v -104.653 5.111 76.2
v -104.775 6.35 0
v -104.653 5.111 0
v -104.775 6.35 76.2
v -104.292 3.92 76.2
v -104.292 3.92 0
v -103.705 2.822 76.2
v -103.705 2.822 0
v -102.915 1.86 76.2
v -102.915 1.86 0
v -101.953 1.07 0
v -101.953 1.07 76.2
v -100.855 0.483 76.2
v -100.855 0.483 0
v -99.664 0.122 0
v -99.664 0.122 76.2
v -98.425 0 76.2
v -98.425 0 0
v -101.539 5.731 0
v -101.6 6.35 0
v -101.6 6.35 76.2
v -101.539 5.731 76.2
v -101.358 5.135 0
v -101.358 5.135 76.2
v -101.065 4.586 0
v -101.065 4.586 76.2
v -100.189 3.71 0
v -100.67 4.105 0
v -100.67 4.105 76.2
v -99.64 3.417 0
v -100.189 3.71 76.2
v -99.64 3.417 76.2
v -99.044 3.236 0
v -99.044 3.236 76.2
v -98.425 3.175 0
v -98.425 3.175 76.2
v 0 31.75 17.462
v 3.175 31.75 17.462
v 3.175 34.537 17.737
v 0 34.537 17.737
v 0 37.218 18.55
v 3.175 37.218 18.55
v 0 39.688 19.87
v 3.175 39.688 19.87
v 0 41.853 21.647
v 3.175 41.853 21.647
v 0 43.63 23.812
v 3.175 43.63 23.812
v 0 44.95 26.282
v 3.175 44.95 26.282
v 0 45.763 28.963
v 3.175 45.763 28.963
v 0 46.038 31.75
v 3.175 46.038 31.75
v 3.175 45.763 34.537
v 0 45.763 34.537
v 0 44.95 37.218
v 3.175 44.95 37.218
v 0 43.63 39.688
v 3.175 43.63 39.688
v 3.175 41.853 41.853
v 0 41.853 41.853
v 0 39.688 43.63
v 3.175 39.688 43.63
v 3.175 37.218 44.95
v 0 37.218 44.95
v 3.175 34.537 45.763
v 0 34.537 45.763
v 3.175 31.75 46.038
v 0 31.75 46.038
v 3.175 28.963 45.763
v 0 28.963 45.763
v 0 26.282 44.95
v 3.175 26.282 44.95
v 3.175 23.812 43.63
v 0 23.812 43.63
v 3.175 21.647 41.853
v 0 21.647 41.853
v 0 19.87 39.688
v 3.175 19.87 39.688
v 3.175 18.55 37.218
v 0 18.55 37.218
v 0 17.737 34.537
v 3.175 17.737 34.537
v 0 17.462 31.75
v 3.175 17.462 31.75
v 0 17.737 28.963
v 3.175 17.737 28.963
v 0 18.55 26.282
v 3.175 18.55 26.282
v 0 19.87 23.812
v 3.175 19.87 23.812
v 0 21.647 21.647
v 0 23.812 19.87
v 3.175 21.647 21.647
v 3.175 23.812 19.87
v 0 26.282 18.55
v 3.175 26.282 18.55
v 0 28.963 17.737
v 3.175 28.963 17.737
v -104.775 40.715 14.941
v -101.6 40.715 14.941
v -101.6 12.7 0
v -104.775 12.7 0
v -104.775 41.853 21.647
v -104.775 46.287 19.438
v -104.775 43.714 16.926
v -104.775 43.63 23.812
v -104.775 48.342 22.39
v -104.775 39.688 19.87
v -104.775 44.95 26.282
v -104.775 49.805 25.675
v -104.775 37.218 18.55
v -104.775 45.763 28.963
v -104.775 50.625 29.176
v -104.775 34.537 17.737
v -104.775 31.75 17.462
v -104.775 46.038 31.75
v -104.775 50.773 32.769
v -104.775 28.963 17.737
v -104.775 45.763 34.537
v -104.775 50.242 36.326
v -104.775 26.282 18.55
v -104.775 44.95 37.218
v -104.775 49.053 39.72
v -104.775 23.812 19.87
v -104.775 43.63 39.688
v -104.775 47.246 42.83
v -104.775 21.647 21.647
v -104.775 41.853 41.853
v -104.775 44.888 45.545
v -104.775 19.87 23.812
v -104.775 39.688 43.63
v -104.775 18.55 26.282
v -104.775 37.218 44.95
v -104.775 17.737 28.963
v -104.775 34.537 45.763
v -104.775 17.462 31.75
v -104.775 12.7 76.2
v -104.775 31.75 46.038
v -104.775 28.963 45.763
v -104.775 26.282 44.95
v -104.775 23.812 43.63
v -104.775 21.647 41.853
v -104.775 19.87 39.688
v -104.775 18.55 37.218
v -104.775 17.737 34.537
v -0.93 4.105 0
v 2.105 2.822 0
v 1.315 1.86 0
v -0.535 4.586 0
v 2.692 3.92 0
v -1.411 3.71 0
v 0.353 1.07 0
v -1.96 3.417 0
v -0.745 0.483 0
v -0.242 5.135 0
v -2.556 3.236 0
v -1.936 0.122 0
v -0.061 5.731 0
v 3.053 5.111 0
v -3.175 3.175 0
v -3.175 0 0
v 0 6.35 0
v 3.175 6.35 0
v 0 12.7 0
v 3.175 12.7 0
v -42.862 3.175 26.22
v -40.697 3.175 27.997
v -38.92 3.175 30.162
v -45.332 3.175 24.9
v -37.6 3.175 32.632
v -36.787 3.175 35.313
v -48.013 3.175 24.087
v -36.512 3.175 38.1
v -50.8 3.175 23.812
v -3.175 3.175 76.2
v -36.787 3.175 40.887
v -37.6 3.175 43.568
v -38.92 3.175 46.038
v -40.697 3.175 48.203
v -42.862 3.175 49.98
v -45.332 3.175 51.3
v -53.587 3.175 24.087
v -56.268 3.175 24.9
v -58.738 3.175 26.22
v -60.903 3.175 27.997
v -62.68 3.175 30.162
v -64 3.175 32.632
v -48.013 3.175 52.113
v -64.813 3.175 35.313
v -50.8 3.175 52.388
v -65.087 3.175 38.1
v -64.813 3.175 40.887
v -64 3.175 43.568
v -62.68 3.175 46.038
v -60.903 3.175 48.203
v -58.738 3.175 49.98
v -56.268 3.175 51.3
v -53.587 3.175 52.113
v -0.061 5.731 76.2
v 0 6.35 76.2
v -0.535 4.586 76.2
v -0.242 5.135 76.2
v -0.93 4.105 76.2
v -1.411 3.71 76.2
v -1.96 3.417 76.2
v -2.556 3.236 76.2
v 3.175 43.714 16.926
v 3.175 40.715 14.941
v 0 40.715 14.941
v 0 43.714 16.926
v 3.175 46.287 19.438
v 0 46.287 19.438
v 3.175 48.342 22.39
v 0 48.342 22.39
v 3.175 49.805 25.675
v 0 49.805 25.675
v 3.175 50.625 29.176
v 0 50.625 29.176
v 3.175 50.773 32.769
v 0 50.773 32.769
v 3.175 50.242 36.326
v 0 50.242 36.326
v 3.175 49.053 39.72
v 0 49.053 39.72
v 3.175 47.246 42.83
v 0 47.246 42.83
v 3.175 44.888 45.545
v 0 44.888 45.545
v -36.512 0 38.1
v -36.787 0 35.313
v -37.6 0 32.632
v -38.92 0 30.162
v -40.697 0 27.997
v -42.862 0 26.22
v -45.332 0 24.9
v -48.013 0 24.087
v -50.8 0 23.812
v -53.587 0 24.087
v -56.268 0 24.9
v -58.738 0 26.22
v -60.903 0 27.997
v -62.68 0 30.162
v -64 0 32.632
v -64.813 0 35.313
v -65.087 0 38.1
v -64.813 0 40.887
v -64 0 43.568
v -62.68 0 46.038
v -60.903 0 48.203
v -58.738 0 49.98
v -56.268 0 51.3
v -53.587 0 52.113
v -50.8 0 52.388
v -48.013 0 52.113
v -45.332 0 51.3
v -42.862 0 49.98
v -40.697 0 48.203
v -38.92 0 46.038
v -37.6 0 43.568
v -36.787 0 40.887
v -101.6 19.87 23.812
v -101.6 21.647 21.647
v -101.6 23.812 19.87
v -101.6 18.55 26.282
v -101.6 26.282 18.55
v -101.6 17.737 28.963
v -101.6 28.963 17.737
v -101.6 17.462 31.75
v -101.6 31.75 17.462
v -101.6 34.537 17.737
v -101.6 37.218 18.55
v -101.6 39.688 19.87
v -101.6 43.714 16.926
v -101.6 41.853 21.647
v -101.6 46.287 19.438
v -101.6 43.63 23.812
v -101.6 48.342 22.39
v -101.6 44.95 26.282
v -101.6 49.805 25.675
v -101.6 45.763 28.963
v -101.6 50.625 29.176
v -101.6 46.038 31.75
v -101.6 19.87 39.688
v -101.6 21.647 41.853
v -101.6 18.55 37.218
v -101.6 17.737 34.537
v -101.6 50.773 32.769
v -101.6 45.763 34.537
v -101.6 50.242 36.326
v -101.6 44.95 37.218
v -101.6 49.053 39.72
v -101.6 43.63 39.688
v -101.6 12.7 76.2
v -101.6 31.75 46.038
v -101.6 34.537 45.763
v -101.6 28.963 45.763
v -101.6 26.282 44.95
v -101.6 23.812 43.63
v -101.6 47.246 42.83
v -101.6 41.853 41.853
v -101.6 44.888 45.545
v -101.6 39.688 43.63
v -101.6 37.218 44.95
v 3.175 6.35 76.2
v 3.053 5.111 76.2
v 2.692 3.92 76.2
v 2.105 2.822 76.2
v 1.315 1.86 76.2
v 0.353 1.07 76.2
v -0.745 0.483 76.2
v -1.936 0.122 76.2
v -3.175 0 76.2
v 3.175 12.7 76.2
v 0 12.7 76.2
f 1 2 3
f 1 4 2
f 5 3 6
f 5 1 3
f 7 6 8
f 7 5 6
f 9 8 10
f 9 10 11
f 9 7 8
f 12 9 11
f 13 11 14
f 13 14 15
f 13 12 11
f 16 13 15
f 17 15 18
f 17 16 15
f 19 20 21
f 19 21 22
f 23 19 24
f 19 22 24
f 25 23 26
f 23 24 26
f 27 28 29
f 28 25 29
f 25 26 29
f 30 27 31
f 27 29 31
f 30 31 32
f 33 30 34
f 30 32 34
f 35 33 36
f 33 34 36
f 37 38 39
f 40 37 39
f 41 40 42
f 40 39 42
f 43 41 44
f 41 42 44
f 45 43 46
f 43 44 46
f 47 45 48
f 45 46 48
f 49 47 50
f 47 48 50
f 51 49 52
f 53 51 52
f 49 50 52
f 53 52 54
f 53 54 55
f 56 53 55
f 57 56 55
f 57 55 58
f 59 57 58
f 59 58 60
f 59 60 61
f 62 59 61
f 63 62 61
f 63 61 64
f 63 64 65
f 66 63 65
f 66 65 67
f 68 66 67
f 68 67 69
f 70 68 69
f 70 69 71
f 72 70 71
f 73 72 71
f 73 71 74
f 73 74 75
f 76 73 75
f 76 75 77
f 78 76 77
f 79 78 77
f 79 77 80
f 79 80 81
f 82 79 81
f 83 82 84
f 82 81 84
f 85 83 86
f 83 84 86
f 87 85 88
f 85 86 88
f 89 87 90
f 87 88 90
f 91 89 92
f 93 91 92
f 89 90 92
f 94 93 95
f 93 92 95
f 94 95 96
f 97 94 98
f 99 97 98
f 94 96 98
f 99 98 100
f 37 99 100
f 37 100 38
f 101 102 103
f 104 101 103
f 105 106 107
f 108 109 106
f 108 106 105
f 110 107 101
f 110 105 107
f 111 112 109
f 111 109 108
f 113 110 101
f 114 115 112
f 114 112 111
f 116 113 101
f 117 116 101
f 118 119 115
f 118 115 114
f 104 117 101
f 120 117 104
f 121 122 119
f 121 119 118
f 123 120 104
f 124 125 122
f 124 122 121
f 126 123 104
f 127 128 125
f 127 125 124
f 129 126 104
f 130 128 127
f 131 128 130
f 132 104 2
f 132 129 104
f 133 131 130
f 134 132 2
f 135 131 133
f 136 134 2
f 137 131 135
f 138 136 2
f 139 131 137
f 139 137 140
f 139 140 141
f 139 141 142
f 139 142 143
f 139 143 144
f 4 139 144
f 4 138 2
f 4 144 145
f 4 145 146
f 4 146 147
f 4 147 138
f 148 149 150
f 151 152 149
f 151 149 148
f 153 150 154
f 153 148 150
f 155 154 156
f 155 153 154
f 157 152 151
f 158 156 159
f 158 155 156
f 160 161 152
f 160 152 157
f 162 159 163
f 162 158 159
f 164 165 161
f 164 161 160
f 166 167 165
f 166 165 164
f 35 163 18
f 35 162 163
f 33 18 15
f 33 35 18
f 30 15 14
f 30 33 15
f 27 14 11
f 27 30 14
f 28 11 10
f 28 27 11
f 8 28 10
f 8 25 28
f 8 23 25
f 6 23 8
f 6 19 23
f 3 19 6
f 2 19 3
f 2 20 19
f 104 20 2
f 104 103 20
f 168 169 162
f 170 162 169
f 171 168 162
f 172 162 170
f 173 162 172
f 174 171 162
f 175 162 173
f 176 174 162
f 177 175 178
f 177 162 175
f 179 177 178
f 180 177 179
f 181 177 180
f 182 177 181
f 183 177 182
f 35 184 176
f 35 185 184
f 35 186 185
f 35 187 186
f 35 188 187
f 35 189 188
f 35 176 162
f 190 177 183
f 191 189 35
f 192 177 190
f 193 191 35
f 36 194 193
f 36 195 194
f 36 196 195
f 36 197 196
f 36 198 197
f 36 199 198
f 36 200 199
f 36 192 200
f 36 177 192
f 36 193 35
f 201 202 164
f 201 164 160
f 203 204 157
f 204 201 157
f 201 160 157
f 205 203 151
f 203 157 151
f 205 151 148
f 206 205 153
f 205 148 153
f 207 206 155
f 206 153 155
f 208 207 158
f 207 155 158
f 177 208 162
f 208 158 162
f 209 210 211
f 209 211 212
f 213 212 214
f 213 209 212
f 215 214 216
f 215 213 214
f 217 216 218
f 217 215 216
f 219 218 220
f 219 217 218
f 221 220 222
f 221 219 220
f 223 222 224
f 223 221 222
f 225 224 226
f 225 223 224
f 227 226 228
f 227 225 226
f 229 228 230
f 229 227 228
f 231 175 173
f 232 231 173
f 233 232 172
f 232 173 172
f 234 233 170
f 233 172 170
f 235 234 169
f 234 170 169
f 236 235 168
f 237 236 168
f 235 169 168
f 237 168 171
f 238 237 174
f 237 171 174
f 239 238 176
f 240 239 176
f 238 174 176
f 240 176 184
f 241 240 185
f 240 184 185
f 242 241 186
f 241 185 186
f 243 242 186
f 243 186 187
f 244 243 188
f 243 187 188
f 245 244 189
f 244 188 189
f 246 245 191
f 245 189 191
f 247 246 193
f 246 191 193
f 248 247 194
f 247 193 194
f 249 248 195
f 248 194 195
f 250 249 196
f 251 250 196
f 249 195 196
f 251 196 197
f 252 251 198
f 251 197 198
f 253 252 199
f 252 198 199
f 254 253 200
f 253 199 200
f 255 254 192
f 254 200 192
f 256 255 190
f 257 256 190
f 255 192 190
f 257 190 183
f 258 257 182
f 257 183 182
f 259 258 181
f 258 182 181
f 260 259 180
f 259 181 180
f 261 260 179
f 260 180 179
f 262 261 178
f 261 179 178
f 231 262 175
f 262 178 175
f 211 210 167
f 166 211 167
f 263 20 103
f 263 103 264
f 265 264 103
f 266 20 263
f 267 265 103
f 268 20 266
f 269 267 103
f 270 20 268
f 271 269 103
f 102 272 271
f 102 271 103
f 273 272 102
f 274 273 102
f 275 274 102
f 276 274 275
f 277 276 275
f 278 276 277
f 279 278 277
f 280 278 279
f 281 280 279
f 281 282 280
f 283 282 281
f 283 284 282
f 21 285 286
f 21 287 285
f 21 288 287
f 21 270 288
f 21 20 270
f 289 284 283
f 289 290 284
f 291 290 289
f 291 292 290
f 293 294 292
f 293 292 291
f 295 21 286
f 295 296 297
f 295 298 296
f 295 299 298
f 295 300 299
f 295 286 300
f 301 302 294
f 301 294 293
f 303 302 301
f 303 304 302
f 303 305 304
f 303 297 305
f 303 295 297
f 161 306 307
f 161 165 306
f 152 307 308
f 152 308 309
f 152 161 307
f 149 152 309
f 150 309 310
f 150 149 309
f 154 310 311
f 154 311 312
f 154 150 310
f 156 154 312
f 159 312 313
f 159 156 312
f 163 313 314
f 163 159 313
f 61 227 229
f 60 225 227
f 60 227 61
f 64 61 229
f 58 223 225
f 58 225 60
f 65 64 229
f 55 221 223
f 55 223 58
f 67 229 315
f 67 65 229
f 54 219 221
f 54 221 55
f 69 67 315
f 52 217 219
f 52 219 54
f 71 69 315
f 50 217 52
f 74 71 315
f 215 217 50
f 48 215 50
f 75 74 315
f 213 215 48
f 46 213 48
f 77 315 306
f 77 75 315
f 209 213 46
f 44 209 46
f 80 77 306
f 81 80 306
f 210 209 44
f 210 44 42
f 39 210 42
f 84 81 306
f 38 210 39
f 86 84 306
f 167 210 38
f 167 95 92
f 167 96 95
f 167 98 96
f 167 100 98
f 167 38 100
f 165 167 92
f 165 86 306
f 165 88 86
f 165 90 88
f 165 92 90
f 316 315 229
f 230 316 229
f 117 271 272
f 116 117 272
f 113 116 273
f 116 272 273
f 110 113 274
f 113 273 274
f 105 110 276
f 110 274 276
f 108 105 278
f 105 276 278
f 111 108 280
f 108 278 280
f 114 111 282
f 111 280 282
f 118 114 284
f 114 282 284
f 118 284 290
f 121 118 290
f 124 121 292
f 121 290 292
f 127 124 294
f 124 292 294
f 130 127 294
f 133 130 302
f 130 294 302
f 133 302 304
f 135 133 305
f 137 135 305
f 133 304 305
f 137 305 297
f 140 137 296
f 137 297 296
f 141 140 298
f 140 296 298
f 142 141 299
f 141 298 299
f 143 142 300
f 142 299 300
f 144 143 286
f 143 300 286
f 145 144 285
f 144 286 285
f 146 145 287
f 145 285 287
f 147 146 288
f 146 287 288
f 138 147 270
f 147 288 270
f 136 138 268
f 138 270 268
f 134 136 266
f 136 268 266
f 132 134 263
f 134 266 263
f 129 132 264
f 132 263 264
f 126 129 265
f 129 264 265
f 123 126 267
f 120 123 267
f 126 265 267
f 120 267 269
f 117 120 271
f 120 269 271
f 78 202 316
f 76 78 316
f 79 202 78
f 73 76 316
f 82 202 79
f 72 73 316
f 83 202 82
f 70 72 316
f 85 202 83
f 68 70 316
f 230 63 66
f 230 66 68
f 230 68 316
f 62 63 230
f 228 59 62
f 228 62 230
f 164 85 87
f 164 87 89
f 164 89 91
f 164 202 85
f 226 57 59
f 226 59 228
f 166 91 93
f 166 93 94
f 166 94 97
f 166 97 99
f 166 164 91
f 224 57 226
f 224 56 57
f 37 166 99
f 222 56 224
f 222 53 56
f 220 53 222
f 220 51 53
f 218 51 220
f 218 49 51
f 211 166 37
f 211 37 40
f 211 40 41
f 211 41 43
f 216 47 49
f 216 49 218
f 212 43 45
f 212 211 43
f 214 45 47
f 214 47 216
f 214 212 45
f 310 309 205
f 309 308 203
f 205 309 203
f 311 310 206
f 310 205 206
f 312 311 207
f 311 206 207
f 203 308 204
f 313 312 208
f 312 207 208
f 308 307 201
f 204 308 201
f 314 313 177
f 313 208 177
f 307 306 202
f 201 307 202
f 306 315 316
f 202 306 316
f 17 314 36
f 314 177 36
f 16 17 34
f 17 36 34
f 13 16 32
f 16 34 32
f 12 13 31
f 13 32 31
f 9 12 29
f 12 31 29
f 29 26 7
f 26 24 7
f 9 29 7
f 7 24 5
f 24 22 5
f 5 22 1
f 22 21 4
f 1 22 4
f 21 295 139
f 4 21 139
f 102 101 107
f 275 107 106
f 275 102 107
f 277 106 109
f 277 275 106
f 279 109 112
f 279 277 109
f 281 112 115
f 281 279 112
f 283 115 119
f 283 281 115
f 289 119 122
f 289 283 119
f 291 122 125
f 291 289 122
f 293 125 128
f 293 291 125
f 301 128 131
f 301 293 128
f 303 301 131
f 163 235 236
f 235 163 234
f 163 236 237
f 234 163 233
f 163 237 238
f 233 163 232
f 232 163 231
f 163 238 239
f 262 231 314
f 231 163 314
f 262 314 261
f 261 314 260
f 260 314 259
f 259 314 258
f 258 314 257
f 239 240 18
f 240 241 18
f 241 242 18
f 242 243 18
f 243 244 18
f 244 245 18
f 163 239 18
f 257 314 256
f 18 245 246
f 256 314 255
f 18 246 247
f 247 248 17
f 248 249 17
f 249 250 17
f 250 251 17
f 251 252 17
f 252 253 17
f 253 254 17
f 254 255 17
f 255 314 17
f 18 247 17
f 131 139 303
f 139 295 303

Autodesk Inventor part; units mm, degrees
ref_plane "YZ Plane" through (0, 0, 0) normal (1, 0, 0) x (0, 1, 0)
ref_plane "XZ Plane" through (0, 0, 0) normal (0, 1, 0) x (-1, 0, 0)
ref_plane "XY Plane" through (0, 0, 0) normal (0, 0, 1) x (1, 0, 0)
sketch "Sketch1" plane through (0, 0, 0) normal (0, 1, 0) x (-1, 0, 0)
  line L0 (0, 0) -> (101.6, 0)
  line L1 (101.6, 0) -> (101.6, 76.2)
  line L2 (101.6, 76.2) -> (0, 76.2)
  line L3 (0, 76.2) -> (0, 0)
  dimension "d0" = 101.6
  dimension "d2" = 76.2
extrude "Plate1" add sketch "Sketch1" along normal blind 3.175
sketch "Sketch2" plane through (-101.6, 3.175, 76.2) normal (-1, 0, 0) x (0, -1, 0)
  line L0 (0, -76.2) -> (0, 0)
  line L1 (0, 0) -> (-47.625, 0)
  line L2 (-47.625, 0) -> (-47.625, -76.2)
  line L3 (-47.625, -76.2) -> (0, -76.2)
edge flange "Flange1" height 50.8 angle 90 thickness 3.175 bend radius 3.175 thickness toward (-1, 0, 0) relief tear relief width 3.175 relief depth 1.5875 edges at (-101.6, 3.175, 38.1) wall of the first edge with corners at (-101.6, 3.175, 0) (-101.6, 3.175, 76.2) (-101.6, 50.8, 76.2) (-101.6, 50.8, 0)
bend "Bend1"
corner "Corner1"
sketch "Sketch3" plane through (0, 3.175, 0) normal (1, 0, 0) x (0, 1, 0)
  line L0 (0, 76.2) -> (0, 0)
  line L1 (0, 0) -> (47.625, 0)
  line L2 (47.625, 0) -> (47.625, 76.2)
  line L3 (47.625, 76.2) -> (0, 76.2)
edge flange "Flange2" height 50.8 angle 90 thickness 3.175 bend radius 3.175 thickness toward (1, 0, 0) relief tear relief width 3.175 relief depth 1.5875 edges at (0, 3.175, 38.1) wall of the first edge with corners at (0, 3.175, 76.2) (0, 3.175, 0) (0, 50.8, 0) (0, 50.8, 76.2)
bend "Bend2"
corner "Corner2"
sketch "Sketch4" plane through (-101.6, 50.8, 76.2) normal (1, 0, 0) x (0, 0, -1)
  line L0 (76.2, 0) -> (0, 0) projected
  circle A0 centre (44.45, -19.05) radius 14.2875
  point P0 (76.2, -50.8)
  dimension "d24" = 28.575
  dimension "d25" = 19.05
extrude "Cut1" cut sketch "Sketch4" against normal mid plane 5080
sketch "Sketch5" plane through (3.175, 50.8, 76.2) normal (1, 0, 0) x (0, 0, -1)
  circle A0 centre (44.45, -19.05) radius 14.2875 projected
  line L0 (0, -44.45) -> (76.2, -44.45) projected
  line L1 (76.2, 0) -> (76.2, -44.45) projected
  line L2 (0, 0) -> (76.2, 0) projected
  line L3 (0, -44.45) -> (0, 0) projected
  arc A1 (61.2588, -10.0853) -> (30.6552, -5.9121) centre (44.45, -19.05) ccw
  line L4 (0, -38.1) -> (30.6552, -5.9121)
  line L5 (61.2588, -10.0853) -> (76.2, -38.1)
  point P0 (76.2, -50.8)
  dimension "d28" = 6.35
  dimension "d29" = 6.35
extrude "Cut2" cut sketch "Sketch5" against normal blind 508 contours L3 L2 A1 L4 | L5 A1 L2 L1
sketch "Sketch6" plane through (0, 3.175, 0) normal (0, 1, 0) x (1, 0, 0)
  circle A0 centre (-50.8, -38.1) radius 14.2875
  line L0 (-3.175, -76.2) -> (-3.175, 0) projected
  line L1 (-3.175, -76.2) -> (-98.425, -76.2) projected
  point P0 (0, 0)
  dimension "d32" = 28.575
  dimension "d35" = 38.1
  dimension "d36" = 47.625
extrude "Cut3" cut sketch "Sketch6" against normal blind 3.175
equation "\"d33\" = Thickness"
equation "\"d4\" = BendReliefWidth"
equation "\"d5\" = BendReliefDepth"
equation "\"d6\" = MinimumRemnant"
equation "\"d7\" = BendRadius"
equation "\"d10\" = BendRadius"
equation "\"d11\" = CornerReliefSize"
equation "\"d12\" = GapSize"
equation "\"d13\" = JacobiRadiusSize"
equation "\"d14\" = BendReliefWidth"
equation "\"d15\" = BendReliefDepth"
equation "\"d16\" = MinimumRemnant"
equation "\"d17\" = BendRadius"
equation "\"d20\" = BendRadius"
equation "\"d21\" = CornerReliefSize"
equation "\"d22\" = GapSize"
equation "\"d23\" = JacobiRadiusSize"
equation "\"BendRadius\" = Thickness"
equation "\"BendReliefWidth\" = Thickness"
equation "\"BendReliefDepth\" = 0.5 * Thickness"
equation "\"CornerReliefSize\" = 4 * Thickness"
equation "\"MinimumRemnant\" = 2 * Thickness"
equation "\"TransitionRadius\" = BendRadius"
equation "\"JacobiRadiusSize\" = BendRadius"
equation "\"GapSize\" = Thickness"
equation "\"d3\" = BendRadius"
equation "\"Thickness\" = 3.175"
properties part number "Bearing Mount 4 v1" material "Aluminum 6061"
